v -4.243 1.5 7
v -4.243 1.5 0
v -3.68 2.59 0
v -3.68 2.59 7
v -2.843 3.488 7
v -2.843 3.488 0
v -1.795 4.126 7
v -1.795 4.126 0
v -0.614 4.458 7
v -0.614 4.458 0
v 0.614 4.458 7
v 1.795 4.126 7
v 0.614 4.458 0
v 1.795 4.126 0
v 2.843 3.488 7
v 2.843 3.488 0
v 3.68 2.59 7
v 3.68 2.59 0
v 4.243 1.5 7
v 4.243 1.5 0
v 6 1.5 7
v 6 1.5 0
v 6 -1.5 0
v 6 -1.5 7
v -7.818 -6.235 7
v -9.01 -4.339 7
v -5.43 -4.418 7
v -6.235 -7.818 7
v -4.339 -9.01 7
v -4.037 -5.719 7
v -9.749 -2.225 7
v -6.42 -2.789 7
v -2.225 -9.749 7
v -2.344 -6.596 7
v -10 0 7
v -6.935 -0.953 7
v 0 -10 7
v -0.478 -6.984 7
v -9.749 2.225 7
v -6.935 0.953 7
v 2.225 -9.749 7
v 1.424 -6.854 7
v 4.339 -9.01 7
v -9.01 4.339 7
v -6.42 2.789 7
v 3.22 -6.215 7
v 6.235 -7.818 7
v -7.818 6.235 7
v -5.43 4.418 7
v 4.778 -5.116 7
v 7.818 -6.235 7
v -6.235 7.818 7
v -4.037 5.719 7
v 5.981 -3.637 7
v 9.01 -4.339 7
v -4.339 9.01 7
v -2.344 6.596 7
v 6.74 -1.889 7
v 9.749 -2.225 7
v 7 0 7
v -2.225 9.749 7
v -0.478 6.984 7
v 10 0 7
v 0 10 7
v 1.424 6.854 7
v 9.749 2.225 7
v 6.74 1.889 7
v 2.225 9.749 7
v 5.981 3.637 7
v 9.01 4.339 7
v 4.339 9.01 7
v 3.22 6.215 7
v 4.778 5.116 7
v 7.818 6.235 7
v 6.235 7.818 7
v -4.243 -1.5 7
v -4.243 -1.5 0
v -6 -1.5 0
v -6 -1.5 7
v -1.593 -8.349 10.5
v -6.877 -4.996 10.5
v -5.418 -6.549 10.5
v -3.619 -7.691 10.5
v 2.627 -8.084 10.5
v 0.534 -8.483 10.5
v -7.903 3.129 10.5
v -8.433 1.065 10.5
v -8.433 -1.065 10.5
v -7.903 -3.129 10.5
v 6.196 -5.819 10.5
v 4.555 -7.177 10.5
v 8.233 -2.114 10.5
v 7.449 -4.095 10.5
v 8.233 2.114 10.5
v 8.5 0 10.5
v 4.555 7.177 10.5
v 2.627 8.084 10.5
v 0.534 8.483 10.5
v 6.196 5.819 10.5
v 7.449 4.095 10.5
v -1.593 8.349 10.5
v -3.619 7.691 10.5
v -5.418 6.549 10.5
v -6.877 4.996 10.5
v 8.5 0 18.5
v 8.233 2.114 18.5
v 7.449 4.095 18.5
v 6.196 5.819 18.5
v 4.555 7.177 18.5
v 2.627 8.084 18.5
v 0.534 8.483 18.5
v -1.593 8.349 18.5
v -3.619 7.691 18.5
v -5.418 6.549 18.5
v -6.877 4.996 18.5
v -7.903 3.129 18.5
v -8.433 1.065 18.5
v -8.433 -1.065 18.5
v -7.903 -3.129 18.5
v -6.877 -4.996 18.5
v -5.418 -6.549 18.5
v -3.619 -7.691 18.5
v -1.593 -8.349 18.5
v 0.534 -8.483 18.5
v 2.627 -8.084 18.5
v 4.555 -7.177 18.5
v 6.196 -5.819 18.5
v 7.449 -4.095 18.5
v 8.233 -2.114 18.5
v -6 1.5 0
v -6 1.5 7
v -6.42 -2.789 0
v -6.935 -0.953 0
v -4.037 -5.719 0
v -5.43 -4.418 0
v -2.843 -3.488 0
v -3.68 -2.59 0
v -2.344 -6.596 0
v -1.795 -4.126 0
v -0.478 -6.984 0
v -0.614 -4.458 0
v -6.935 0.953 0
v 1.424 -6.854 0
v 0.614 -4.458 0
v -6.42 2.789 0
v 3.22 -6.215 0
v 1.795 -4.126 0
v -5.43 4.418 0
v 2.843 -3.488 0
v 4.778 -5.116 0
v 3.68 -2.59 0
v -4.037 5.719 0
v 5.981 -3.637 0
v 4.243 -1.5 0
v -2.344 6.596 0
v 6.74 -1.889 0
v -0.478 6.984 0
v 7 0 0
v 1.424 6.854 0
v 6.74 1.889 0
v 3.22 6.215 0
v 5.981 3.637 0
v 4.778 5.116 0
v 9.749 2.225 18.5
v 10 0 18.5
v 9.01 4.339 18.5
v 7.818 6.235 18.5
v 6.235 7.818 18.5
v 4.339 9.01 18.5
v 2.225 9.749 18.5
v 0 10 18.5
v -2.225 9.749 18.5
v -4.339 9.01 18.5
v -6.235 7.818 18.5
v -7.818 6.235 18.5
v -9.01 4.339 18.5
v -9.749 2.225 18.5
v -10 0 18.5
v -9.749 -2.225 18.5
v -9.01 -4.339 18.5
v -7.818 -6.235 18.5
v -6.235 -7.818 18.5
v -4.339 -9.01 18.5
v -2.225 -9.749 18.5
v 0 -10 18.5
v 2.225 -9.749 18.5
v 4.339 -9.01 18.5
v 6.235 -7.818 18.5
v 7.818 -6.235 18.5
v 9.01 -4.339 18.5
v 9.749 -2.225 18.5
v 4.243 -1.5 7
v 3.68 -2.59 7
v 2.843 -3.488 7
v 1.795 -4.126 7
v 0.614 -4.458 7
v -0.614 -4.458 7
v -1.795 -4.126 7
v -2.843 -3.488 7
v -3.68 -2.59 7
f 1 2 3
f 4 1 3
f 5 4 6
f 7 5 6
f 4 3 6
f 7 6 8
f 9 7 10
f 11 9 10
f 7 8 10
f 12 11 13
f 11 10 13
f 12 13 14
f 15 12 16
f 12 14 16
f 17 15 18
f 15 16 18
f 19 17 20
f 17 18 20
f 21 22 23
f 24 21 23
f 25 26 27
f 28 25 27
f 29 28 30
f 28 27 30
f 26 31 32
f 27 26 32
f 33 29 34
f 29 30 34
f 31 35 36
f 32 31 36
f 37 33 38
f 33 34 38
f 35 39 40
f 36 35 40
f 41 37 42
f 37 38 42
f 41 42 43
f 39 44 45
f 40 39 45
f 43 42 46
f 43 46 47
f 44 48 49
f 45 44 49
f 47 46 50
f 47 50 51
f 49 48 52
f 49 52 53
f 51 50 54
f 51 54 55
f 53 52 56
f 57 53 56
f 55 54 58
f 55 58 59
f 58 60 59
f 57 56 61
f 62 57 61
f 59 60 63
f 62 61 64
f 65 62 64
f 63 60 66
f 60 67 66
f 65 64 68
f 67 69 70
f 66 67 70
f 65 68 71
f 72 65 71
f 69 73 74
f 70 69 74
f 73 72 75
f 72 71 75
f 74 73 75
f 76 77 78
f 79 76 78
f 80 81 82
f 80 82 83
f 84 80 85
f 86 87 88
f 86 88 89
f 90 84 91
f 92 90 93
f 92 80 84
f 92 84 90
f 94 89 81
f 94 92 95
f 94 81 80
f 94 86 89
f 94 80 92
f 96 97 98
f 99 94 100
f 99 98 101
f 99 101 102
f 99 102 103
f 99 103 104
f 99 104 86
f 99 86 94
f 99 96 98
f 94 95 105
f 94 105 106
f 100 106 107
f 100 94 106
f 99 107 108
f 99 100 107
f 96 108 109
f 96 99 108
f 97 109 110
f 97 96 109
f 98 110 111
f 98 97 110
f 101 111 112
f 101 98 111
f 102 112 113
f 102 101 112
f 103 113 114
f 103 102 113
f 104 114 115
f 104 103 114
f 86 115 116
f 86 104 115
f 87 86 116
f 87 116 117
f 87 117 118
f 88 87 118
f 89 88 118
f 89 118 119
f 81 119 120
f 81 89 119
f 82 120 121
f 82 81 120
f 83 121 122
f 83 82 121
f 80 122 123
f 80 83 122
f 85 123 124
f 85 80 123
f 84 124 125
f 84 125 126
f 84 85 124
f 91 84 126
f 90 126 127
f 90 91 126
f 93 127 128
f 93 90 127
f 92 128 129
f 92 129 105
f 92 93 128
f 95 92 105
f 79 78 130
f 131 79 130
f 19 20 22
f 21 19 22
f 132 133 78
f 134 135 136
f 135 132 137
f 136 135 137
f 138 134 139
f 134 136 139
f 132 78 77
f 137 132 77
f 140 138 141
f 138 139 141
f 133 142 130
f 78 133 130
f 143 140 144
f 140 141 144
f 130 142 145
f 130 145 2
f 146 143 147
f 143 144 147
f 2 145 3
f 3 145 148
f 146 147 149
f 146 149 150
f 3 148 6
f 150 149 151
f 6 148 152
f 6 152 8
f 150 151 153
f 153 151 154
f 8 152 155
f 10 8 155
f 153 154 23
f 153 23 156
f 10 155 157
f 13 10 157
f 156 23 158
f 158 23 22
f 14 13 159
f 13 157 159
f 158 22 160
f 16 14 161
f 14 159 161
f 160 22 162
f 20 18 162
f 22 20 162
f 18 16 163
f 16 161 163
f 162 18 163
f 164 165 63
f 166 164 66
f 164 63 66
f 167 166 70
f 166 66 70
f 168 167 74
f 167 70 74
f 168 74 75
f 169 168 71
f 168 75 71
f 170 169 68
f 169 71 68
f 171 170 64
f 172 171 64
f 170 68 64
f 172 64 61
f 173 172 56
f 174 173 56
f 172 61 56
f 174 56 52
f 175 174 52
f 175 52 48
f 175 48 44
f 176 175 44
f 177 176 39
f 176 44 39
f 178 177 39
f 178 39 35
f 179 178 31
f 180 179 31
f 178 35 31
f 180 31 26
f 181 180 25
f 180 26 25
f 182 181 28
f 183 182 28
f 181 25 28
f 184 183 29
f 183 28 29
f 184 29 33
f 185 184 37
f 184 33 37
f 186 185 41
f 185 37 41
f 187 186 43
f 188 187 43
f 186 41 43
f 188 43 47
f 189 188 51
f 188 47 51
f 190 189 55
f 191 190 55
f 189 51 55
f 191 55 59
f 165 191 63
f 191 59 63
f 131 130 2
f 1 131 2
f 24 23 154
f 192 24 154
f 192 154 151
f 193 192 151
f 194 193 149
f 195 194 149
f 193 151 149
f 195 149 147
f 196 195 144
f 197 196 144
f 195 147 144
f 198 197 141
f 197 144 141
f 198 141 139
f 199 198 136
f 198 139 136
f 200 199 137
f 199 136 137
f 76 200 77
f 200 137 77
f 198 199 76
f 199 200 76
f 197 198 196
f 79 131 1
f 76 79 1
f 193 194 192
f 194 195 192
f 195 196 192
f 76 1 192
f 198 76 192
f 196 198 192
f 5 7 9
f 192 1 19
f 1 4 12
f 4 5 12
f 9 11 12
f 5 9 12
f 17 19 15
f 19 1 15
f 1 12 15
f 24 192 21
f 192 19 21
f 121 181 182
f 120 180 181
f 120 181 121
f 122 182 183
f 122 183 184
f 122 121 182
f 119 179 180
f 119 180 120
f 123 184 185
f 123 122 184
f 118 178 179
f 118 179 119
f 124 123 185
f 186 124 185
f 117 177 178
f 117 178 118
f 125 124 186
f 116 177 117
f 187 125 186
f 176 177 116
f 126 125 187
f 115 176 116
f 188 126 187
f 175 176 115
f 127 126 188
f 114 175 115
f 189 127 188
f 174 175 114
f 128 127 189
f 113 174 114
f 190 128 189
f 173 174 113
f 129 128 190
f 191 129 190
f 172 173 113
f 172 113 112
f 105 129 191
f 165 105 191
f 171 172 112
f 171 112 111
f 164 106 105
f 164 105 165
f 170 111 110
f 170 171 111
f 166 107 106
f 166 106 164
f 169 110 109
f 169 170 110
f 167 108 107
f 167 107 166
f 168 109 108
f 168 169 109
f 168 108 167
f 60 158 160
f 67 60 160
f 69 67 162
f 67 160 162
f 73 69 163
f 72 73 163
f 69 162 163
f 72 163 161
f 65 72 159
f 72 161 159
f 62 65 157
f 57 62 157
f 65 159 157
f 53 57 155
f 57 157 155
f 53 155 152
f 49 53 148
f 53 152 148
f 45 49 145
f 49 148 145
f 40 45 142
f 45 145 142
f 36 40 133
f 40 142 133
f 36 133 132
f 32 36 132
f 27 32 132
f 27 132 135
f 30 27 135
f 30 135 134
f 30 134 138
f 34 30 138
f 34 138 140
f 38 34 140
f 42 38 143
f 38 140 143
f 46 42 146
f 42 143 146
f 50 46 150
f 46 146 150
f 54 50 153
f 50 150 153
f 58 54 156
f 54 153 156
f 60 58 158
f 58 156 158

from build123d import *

# Parameters (mm, degrees)
F0_R     = 7
F1_DEPTH = 7
F2_R     = 10
F2_R_2   = 8.5
F2_R_3   = 7
F3_DEPTH = 3.5
F4_R     = 10
F4_R_2   = 8.5
F5_DEPTH = 8


with BuildPart() as f1:
    # F0 (on Top) → F1 (new body)
    with BuildSketch(Plane.XY):
        Circle(F0_R)
        with BuildLine():
            ThreePointArc((-4.2426406871, 1.5), (0, 4.5), (4.2426406871, 1.5))
            Line((4.2426406871, 1.5), (6, 1.5))
            Line((6, 1.5), (6, 0))
            Line((6, 0), (6, -1.5))
            Line((6, -1.5), (4.2426406871, -1.5))
            ThreePointArc((4.2426406871, -1.5), (0, -4.5), (-4.2426406871, -1.5))
            Line((-4.2426406871, -1.5), (-6, -1.5))
            Line((-6, -1.5), (-6, 0))
            Line((-6, 0), (-6, 1.5))
            Line((-6, 1.5), (-4.2426406871, 1.5))
        make_face(mode=Mode.SUBTRACT)
    extrude(amount=F1_DEPTH)

    # F2 (on face) → F3 (join)
    with BuildSketch(Plane.XY.offset(7)):
        Circle(F2_R)
        Circle(F2_R_2, mode=Mode.SUBTRACT)
        Circle(F2_R_2)
        Circle(F2_R_3, mode=Mode.SUBTRACT)
        Circle(F2_R_3)
        with BuildLine():
            Line((-6, 1.5), (-4.2426406871, 1.5))
            ThreePointArc((-4.2426406871, 1.5), (0, 4.5), (4.2426406871, 1.5))
            Line((4.2426406871, 1.5), (6, 1.5))
            Line((6, 1.5), (6, -1.5))
            Line((6, -1.5), (4.2426406871, -1.5))
            ThreePointArc((4.2426406871, -1.5), (0, -4.5), (-4.2426406871, -1.5))
            Line((-4.2426406871, -1.5), (-6, -1.5))
            Line((-6, -1.5), (-6, 1.5))
        make_face(mode=Mode.SUBTRACT)
        with BuildLine():
            ThreePointArc((4.2426406871, 1.5), (0, 4.5), (-4.2426406871, 1.5))
            Line((-4.2426406871, 1.5), (-6, 1.5))
            Line((-6, 1.5), (-6, -1.5))
            Line((-6, -1.5), (-4.2426406871, -1.5))
            ThreePointArc((-4.2426406871, -1.5), (0, -4.5), (4.2426406871, -1.5))
            Line((4.2426406871, -1.5), (6, -1.5))
            Line((6, -1.5), (6, 1.5))
            Line((6, 1.5), (4.2426406871, 1.5))
        make_face()
    extrude(amount=F3_DEPTH)

    # F4 (on face) → F5 (join)
    with BuildSketch(Plane.XY.offset(10.5)):
        Circle(F4_R)
        Circle(F4_R_2, mode=Mode.SUBTRACT)
    extrude(amount=F5_DEPTH)


solid = f1.part
